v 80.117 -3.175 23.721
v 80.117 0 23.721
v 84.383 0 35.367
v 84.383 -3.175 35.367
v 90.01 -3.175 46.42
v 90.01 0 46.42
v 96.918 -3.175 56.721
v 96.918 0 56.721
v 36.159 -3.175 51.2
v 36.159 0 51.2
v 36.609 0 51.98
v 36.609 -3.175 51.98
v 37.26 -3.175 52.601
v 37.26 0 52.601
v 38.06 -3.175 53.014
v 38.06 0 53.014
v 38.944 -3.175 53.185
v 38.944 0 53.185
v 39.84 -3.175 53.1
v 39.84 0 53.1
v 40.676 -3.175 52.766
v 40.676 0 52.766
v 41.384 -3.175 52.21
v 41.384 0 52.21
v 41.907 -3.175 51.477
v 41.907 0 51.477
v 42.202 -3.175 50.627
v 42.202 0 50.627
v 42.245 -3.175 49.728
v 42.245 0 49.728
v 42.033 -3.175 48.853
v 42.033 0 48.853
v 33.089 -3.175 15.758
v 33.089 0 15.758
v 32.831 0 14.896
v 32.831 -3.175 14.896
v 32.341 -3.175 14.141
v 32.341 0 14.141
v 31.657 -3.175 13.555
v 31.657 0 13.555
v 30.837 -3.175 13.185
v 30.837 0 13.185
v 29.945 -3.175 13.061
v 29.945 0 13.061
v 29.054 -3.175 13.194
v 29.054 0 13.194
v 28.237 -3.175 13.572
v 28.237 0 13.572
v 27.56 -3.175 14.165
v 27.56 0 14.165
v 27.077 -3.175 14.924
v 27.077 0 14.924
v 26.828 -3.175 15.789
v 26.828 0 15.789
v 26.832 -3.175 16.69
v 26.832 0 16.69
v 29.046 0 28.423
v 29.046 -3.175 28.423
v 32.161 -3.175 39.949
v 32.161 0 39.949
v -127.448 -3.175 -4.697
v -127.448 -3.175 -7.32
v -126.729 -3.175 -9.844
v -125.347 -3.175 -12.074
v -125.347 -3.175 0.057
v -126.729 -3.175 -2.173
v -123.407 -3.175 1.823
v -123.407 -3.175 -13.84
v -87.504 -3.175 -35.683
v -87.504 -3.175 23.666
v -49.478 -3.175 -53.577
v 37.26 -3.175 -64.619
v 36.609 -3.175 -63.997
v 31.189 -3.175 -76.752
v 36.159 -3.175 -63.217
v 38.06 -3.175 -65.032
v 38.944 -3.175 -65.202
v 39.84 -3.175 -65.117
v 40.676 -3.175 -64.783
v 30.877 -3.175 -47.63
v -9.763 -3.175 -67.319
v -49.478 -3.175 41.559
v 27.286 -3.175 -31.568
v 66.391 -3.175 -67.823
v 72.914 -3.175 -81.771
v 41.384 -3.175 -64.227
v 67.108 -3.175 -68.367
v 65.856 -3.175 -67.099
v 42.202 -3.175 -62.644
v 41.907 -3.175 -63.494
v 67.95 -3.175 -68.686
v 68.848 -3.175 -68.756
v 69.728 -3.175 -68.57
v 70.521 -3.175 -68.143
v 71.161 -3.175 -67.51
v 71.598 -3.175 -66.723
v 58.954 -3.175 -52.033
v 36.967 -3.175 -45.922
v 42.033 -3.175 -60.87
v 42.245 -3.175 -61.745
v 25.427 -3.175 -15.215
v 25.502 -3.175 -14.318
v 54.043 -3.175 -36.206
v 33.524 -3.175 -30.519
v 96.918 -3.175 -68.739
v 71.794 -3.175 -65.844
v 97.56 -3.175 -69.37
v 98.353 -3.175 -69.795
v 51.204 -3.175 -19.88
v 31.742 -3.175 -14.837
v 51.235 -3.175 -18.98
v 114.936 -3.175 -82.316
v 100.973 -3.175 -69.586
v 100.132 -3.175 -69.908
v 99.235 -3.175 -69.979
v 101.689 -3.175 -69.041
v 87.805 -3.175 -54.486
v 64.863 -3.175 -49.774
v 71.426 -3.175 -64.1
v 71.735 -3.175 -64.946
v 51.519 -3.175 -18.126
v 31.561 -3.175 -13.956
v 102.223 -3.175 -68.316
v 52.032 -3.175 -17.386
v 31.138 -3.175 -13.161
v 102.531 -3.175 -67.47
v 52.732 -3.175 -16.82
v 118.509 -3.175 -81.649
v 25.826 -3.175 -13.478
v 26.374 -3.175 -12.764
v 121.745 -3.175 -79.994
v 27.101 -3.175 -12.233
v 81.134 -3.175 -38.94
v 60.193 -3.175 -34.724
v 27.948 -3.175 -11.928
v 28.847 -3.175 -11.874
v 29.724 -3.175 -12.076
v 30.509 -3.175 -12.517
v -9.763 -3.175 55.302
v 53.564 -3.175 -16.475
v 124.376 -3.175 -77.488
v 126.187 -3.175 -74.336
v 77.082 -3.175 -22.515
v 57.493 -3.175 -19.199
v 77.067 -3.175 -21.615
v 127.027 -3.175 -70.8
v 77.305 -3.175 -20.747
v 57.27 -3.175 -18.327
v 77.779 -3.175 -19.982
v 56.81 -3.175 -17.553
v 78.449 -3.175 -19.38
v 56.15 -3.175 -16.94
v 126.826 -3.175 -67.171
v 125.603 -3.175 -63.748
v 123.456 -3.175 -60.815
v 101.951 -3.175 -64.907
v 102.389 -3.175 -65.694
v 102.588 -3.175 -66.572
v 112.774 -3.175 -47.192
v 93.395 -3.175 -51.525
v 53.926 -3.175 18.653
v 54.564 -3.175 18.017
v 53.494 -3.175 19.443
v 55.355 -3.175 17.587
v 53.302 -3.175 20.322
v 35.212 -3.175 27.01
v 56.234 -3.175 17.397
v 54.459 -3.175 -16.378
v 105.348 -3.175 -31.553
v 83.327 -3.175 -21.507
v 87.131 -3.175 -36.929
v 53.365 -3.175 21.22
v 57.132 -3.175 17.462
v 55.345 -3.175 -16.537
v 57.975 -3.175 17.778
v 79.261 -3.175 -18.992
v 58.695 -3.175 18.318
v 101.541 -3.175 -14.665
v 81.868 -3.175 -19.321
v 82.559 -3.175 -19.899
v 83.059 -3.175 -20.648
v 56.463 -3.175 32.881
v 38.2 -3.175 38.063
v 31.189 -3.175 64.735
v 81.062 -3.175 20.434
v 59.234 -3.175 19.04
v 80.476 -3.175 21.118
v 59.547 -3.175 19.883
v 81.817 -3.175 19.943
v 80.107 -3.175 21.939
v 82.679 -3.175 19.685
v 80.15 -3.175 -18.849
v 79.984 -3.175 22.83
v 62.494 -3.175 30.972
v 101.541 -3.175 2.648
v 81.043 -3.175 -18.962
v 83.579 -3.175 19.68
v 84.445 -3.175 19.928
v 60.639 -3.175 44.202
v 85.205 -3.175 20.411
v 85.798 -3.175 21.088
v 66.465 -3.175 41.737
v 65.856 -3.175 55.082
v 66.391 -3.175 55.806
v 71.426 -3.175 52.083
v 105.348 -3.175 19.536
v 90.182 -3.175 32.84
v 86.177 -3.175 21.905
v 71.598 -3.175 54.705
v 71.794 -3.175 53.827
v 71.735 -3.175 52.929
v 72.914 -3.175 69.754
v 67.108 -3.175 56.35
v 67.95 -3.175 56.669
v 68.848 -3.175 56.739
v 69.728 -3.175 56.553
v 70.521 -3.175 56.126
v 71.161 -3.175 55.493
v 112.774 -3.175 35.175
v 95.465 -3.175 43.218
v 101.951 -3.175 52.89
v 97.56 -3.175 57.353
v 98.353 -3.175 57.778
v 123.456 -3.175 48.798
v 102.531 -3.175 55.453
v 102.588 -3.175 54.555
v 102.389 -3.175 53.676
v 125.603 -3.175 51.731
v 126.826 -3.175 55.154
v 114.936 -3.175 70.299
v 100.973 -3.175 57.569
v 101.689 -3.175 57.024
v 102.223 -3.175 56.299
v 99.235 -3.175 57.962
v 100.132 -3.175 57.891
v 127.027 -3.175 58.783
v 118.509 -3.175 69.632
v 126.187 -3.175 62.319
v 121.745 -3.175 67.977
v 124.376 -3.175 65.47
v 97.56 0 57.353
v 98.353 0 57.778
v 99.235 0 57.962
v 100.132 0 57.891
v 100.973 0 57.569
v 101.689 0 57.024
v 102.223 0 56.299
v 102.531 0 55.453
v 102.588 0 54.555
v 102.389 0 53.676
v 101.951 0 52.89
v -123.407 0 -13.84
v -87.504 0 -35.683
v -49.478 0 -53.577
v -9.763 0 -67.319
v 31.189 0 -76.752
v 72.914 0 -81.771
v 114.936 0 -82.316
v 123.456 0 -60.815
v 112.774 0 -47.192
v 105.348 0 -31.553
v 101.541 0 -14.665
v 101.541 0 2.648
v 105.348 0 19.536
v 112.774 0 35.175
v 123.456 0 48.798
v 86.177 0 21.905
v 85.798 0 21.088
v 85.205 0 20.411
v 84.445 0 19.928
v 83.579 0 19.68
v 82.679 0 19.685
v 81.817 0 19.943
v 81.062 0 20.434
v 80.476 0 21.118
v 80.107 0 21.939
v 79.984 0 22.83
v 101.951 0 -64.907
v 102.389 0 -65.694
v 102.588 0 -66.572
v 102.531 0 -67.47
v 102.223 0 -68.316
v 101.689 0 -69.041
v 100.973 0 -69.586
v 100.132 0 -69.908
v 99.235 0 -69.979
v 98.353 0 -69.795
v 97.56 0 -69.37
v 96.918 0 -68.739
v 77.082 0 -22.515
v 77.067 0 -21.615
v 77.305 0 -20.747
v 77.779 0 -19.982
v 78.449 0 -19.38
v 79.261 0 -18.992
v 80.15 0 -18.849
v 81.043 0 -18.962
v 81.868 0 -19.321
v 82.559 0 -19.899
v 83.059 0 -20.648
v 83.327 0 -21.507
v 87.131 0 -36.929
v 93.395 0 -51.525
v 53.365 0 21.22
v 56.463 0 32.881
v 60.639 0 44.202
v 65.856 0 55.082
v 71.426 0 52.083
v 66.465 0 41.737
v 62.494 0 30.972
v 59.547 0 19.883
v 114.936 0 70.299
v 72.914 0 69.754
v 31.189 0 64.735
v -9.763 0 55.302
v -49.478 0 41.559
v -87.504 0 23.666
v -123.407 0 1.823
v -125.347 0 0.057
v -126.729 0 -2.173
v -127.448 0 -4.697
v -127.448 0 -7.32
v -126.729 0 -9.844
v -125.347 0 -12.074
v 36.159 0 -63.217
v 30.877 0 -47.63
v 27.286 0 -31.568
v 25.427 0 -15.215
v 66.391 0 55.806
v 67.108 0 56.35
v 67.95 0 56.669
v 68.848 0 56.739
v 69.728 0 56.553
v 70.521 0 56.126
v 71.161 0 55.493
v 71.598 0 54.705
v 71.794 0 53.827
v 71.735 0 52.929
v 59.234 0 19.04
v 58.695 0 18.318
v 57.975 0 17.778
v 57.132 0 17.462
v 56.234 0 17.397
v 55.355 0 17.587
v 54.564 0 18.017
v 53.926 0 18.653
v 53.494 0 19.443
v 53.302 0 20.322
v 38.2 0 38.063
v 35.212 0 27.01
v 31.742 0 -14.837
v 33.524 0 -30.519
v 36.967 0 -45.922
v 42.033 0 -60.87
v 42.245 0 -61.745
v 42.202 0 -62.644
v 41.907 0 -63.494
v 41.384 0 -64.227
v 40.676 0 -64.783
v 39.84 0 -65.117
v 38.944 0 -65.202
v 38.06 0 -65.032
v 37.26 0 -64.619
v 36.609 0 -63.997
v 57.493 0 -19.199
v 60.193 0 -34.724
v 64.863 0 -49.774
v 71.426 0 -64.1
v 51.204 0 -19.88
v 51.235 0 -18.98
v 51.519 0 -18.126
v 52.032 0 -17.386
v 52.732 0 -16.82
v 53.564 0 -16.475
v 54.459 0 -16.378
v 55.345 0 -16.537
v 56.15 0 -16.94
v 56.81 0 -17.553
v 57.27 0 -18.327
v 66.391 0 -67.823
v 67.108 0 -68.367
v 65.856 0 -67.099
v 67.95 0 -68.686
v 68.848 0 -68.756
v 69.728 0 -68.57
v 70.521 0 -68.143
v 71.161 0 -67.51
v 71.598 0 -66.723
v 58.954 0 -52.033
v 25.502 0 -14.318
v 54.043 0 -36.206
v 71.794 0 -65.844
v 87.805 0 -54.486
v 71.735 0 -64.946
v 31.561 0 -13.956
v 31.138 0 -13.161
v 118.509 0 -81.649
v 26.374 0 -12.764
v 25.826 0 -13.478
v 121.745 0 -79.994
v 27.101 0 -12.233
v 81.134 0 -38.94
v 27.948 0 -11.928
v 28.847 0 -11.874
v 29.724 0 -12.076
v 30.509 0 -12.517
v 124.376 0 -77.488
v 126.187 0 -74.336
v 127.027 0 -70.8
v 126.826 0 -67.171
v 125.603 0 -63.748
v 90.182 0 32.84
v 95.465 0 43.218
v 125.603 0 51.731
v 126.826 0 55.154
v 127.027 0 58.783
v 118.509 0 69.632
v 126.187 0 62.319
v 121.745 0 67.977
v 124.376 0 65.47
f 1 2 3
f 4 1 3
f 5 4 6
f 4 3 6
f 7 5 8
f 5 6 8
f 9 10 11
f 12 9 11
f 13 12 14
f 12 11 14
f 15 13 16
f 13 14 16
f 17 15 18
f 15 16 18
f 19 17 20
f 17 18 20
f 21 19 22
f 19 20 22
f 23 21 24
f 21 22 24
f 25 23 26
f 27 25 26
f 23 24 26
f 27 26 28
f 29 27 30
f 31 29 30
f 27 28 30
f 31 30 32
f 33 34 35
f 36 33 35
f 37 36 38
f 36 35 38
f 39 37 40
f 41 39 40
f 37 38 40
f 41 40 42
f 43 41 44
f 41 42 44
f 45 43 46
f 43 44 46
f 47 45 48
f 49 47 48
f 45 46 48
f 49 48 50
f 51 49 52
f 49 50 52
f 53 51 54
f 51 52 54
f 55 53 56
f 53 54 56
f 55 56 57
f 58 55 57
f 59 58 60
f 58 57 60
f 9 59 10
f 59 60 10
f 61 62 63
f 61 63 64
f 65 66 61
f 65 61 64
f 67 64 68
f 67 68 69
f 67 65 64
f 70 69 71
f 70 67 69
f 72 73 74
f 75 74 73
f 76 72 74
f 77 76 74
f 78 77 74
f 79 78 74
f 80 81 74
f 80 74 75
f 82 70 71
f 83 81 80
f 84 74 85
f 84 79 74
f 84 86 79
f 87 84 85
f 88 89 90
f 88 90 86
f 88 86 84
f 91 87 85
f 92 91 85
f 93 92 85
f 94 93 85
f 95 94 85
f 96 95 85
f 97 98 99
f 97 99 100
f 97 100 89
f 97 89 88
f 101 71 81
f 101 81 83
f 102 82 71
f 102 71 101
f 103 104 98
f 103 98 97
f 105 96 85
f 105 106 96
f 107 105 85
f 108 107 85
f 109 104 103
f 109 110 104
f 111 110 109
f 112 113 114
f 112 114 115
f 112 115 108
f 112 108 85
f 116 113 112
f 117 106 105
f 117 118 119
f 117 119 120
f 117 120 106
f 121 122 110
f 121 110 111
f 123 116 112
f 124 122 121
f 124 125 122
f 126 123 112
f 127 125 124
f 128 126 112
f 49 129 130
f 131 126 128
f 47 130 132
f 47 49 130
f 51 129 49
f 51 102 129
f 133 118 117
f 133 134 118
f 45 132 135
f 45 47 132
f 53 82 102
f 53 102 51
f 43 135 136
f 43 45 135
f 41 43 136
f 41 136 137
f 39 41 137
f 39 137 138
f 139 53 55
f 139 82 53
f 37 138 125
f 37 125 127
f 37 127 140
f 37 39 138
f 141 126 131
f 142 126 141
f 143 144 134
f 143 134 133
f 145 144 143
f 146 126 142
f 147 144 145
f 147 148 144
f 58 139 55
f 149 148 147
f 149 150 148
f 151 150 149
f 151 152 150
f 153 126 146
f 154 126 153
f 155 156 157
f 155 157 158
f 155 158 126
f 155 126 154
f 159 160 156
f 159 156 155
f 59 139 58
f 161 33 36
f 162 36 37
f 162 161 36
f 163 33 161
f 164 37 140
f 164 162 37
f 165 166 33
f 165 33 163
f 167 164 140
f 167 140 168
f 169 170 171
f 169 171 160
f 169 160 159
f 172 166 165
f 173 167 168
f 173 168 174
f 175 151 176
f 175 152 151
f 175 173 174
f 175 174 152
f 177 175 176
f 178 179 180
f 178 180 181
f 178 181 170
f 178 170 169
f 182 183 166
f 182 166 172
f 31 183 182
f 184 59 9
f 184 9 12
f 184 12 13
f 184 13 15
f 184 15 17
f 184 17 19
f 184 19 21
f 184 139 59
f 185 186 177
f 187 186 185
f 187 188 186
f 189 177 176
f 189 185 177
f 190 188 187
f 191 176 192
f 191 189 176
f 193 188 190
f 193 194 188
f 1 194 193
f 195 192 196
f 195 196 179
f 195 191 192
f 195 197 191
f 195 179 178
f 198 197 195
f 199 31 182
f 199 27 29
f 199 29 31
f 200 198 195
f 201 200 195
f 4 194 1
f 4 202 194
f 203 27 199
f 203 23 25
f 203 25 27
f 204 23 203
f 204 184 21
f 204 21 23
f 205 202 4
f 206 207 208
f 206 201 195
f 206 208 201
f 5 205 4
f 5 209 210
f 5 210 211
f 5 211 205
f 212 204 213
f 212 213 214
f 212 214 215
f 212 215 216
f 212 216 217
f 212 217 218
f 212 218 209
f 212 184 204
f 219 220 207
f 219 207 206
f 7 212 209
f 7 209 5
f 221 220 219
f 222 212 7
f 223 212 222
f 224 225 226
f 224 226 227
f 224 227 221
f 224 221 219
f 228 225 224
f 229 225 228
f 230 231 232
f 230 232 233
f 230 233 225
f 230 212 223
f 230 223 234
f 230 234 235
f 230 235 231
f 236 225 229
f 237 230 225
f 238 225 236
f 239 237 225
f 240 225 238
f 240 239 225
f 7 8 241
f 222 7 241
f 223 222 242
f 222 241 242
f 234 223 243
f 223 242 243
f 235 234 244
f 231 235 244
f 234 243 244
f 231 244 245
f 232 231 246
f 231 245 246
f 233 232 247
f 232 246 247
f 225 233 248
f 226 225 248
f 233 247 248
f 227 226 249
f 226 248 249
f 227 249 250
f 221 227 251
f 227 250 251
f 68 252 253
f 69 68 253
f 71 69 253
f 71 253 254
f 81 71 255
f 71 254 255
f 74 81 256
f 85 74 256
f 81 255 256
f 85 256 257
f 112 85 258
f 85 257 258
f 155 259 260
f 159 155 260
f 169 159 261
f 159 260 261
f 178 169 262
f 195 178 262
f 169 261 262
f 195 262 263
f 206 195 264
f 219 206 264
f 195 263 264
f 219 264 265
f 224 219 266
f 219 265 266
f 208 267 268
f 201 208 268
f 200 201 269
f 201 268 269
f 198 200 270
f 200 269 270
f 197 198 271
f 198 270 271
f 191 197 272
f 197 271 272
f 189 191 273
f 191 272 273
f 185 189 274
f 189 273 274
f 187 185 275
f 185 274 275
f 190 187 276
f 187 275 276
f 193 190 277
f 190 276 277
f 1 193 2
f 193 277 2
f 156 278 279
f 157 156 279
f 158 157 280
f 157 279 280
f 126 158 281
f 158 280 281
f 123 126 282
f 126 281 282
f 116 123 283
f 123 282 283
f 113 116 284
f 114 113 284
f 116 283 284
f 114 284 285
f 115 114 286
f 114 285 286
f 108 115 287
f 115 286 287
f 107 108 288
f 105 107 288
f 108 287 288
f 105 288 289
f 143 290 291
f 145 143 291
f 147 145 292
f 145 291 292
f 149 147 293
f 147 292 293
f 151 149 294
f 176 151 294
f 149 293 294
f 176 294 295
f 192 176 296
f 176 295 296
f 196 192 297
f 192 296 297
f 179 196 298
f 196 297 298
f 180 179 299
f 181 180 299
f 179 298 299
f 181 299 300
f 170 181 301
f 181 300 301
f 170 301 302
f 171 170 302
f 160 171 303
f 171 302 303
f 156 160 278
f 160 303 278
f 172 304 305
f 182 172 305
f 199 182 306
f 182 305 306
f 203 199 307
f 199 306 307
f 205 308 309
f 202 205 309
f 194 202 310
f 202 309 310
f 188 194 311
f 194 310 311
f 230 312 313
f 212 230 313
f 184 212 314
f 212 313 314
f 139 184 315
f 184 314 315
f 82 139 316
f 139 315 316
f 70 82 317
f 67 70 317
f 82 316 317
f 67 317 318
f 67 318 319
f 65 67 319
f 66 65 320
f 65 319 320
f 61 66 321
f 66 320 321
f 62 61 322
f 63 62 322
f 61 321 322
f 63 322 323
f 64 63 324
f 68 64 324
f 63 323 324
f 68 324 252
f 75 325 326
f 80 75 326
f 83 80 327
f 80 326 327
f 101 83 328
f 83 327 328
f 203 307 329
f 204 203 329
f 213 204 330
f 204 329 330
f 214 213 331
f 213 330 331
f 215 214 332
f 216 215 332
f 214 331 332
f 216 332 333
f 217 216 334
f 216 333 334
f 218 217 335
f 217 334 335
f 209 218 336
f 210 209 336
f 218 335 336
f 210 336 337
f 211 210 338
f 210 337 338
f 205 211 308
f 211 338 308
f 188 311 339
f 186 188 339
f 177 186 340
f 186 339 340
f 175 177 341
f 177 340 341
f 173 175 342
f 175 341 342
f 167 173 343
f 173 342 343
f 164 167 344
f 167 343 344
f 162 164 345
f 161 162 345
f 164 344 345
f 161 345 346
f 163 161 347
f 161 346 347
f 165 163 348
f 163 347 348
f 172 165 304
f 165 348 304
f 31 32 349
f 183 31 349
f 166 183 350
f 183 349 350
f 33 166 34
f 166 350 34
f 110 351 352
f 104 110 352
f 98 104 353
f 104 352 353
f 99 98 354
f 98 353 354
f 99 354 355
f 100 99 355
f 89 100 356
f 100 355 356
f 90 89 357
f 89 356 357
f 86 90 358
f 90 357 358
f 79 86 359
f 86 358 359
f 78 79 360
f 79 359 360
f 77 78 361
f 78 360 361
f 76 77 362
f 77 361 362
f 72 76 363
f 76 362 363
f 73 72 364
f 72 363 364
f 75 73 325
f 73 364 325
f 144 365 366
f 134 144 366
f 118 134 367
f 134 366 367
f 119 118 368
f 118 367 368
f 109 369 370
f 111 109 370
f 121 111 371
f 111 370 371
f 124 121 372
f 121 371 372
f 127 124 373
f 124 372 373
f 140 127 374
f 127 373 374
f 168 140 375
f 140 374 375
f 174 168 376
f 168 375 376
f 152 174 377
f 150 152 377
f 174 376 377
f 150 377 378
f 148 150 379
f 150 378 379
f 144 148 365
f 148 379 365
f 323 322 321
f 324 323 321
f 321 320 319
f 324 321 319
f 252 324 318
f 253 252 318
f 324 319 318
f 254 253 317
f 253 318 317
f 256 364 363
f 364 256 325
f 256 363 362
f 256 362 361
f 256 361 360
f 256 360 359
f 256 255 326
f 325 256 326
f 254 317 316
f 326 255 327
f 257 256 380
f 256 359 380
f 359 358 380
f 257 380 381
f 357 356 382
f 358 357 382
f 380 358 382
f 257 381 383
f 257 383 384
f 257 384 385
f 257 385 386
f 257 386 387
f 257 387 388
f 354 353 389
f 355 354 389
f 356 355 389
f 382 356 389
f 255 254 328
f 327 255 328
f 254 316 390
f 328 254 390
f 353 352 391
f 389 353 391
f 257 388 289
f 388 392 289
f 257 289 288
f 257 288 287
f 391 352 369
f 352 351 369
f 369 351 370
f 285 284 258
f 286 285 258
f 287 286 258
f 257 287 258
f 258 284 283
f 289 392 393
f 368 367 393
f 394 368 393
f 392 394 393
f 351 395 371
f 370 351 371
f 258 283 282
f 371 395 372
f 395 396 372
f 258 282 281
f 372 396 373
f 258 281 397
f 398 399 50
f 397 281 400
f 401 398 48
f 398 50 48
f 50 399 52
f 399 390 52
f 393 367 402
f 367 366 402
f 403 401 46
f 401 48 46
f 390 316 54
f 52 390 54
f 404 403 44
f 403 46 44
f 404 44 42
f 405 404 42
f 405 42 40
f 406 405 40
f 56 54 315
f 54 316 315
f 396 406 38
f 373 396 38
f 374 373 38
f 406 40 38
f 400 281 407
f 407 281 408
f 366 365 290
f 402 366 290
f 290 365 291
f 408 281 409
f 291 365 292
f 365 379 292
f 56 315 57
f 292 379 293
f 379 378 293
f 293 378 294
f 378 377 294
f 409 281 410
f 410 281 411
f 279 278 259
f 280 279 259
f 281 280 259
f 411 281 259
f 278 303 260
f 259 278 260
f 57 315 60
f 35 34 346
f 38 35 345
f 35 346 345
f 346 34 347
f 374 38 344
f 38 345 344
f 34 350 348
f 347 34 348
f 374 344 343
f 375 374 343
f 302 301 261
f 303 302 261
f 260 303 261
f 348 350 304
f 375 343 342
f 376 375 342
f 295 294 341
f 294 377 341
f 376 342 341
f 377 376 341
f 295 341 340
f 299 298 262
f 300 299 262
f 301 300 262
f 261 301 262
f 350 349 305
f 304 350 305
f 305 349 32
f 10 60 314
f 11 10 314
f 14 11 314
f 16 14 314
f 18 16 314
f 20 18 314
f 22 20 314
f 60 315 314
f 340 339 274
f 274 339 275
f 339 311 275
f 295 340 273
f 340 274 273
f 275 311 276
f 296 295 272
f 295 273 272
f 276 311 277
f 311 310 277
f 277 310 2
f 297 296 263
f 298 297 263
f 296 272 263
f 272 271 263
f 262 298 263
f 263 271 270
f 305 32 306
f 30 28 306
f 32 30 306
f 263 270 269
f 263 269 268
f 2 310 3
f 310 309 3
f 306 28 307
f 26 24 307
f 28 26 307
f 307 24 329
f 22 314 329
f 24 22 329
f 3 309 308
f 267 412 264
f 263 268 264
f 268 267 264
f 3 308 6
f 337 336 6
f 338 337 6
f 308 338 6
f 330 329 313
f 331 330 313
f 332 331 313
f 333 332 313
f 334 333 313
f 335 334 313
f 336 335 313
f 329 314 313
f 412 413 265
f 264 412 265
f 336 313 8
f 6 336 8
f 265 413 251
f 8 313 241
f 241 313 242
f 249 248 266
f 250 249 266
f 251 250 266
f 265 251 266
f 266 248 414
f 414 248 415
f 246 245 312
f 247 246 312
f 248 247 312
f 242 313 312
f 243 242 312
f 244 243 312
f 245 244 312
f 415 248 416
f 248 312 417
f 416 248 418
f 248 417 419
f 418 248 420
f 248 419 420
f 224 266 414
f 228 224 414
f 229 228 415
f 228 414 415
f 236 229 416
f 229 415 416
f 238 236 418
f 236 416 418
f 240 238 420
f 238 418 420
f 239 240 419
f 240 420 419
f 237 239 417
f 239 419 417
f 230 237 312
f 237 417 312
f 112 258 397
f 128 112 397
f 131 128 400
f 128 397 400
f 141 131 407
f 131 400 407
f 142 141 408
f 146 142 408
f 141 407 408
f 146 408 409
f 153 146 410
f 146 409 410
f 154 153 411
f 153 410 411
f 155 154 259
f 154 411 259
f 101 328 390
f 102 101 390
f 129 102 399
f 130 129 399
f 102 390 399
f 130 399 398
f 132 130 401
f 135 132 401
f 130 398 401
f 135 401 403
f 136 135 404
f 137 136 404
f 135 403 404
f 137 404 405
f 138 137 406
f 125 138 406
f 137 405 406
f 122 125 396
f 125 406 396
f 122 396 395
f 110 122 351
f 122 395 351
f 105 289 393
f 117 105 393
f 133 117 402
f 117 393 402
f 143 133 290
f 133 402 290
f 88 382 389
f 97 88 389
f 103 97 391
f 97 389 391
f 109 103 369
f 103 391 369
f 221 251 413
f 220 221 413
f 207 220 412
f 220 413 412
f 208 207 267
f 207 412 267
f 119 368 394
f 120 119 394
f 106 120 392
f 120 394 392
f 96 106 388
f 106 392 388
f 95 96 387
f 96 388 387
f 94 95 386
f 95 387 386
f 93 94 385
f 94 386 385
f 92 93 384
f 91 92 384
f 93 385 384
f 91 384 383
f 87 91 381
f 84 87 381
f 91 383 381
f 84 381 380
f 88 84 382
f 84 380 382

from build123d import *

# Parameters (mm, degrees)
F1_DEPTH = 3.175


# Not quite as in the source:
# - ends of sketch curves that miss each other by under 0.0002 mm in the source are joined


with BuildPart() as f1:
    # F0 (on Front) → F1 (new body)
    with BuildSketch(Plane.XZ):
        with BuildLine():
            ThreePointArc((-123.4070797919, 1.8233010265), (-127.5387969828, -6.0085300089), (-123.4070915827, -13.8403672647))
            ThreePointArc((-123.4070915827, -13.8403672647), (-9.7633198011, -67.3185862363), (114.9359014402, -82.3162835053))
            ThreePointArc((114.9359014402, -82.3162835053), (126.1869378761, -74.3359779231), (123.456379114, -60.815058194))
            ThreePointArc((123.456379114, -60.815058194), (101.0612030172, -6.0085281204), (123.4563821883, 48.798006178))
            ThreePointArc((123.4563821883, 48.798006178), (126.1869343608, 62.3189124907), (114.9359007509, 70.2992174423))
            ThreePointArc((114.9359007509, 70.2992174423), (-9.7633198011, 55.3015372363), (-123.4070797919, 1.8233010265))
        make_face()
        with BuildLine():
            ThreePointArc((77.0821397385, -22.5154604101), (79.7004591586, -18.8888761314), (83.3270330978, -21.5072098724))
            ThreePointArc((83.3270330978, -21.5072098724), (89.9643653266, -44.3549576844), (101.9514625839, -64.9069229437))
            ThreePointArc((101.9514625839, -64.9069229437), (101.3506333254, -69.3393586044), (96.9181875419, -68.7385326678))
            ThreePointArc((96.9181875419, -68.7385326678), (84.1512609661, -46.8495678563), (77.0821397385, -22.5154604101))
        make_face(mode=Mode.SUBTRACT)
        with BuildLine():
            ThreePointArc((25.4272095012, -15.2152278243), (28.3955581041, -11.8691050411), (31.7416808873, -14.837453644))
            ThreePointArc((31.7416808873, -14.837453644), (35.0399400748, -38.2666108744), (42.033430024, -60.8695978255))
            ThreePointArc((42.033430024, -60.8695978255), (40.2700359641, -64.9803081743), (36.1593147519, -63.2169312407))
            ThreePointArc((36.1593147519, -63.2169312407), (28.8665917441, -39.6468400601), (25.4272095012, -15.2152278243))
        make_face(mode=Mode.SUBTRACT)
        with BuildLine():
            ThreePointArc((51.2038323174, -19.8796162989), (54.0078974535, -16.3946587115), (57.4928438898, -19.1987377064))
            ThreePointArc((57.4928438898, -19.1987377064), (62.2856351867, -42.3239729178), (71.4255090517, -64.1003387977))
            ThreePointArc((71.4255090517, -64.1003387977), (70.1400475431, -68.384628042), (65.855751892, -67.099154634))
            ThreePointArc((65.855751892, -67.099154634), (56.24403894, -44.1986400904), (51.2038323174, -19.8796162989))
        make_face(mode=Mode.SUBTRACT)
        with BuildLine():
            ThreePointArc((26.8321292417, 16.6896378099), (30.4920693109, 34.2160200507), (36.1593192267, 51.1998804526))
            ThreePointArc((36.1593192267, 51.1998804526), (40.2700359641, 52.9632591743), (42.0334342681, 48.8525471295))
            ThreePointArc((42.0334342681, 48.8525471295), (36.5987212677, 32.5655461507), (33.0889530651, 15.7582851057))
            ThreePointArc((33.0889530651, 15.7582851057), (29.4948750618, 13.0955480188), (26.8321292417, 16.6896378099))
        make_face(mode=Mode.SUBTRACT)
        with BuildLine():
            ThreePointArc((53.3645508696, 21.2199967221), (58.4187785321, 38.5905299983), (65.8557505543, 55.0821063543))
            ThreePointArc((65.8557505543, 55.0821063543), (70.1400475431, 56.367579042), (71.425520951, 52.0832833909))
            ThreePointArc((71.425520951, 52.0832833909), (64.3536192611, 36.4012543788), (59.5474961242, 19.8834151887))
            ThreePointArc((59.5474961242, 19.8834151887), (55.7877392052, 17.4602445799), (53.3645508696, 21.2199967221))
        make_face(mode=Mode.SUBTRACT)
        with BuildLine():
            ThreePointArc((80.1169824074, 23.7207222996), (87.030580802, 40.9781600378), (96.9181889515, 56.7214825948))
            ThreePointArc((96.9181889515, 56.7214825948), (101.3506333254, 57.3223096044), (101.9514733693, 52.8898657333))
            ThreePointArc((101.9514733693, 52.8898657333), (92.6678111275, 38.108160652), (86.1765020812, 21.9048248522))
            ThreePointArc((86.1765020812, 21.9048248522), (82.2387981181, 19.7830123613), (80.1169824074, 23.7207222996))
        make_face(mode=Mode.SUBTRACT)
    extrude(amount=F1_DEPTH)


solid = f1.part
